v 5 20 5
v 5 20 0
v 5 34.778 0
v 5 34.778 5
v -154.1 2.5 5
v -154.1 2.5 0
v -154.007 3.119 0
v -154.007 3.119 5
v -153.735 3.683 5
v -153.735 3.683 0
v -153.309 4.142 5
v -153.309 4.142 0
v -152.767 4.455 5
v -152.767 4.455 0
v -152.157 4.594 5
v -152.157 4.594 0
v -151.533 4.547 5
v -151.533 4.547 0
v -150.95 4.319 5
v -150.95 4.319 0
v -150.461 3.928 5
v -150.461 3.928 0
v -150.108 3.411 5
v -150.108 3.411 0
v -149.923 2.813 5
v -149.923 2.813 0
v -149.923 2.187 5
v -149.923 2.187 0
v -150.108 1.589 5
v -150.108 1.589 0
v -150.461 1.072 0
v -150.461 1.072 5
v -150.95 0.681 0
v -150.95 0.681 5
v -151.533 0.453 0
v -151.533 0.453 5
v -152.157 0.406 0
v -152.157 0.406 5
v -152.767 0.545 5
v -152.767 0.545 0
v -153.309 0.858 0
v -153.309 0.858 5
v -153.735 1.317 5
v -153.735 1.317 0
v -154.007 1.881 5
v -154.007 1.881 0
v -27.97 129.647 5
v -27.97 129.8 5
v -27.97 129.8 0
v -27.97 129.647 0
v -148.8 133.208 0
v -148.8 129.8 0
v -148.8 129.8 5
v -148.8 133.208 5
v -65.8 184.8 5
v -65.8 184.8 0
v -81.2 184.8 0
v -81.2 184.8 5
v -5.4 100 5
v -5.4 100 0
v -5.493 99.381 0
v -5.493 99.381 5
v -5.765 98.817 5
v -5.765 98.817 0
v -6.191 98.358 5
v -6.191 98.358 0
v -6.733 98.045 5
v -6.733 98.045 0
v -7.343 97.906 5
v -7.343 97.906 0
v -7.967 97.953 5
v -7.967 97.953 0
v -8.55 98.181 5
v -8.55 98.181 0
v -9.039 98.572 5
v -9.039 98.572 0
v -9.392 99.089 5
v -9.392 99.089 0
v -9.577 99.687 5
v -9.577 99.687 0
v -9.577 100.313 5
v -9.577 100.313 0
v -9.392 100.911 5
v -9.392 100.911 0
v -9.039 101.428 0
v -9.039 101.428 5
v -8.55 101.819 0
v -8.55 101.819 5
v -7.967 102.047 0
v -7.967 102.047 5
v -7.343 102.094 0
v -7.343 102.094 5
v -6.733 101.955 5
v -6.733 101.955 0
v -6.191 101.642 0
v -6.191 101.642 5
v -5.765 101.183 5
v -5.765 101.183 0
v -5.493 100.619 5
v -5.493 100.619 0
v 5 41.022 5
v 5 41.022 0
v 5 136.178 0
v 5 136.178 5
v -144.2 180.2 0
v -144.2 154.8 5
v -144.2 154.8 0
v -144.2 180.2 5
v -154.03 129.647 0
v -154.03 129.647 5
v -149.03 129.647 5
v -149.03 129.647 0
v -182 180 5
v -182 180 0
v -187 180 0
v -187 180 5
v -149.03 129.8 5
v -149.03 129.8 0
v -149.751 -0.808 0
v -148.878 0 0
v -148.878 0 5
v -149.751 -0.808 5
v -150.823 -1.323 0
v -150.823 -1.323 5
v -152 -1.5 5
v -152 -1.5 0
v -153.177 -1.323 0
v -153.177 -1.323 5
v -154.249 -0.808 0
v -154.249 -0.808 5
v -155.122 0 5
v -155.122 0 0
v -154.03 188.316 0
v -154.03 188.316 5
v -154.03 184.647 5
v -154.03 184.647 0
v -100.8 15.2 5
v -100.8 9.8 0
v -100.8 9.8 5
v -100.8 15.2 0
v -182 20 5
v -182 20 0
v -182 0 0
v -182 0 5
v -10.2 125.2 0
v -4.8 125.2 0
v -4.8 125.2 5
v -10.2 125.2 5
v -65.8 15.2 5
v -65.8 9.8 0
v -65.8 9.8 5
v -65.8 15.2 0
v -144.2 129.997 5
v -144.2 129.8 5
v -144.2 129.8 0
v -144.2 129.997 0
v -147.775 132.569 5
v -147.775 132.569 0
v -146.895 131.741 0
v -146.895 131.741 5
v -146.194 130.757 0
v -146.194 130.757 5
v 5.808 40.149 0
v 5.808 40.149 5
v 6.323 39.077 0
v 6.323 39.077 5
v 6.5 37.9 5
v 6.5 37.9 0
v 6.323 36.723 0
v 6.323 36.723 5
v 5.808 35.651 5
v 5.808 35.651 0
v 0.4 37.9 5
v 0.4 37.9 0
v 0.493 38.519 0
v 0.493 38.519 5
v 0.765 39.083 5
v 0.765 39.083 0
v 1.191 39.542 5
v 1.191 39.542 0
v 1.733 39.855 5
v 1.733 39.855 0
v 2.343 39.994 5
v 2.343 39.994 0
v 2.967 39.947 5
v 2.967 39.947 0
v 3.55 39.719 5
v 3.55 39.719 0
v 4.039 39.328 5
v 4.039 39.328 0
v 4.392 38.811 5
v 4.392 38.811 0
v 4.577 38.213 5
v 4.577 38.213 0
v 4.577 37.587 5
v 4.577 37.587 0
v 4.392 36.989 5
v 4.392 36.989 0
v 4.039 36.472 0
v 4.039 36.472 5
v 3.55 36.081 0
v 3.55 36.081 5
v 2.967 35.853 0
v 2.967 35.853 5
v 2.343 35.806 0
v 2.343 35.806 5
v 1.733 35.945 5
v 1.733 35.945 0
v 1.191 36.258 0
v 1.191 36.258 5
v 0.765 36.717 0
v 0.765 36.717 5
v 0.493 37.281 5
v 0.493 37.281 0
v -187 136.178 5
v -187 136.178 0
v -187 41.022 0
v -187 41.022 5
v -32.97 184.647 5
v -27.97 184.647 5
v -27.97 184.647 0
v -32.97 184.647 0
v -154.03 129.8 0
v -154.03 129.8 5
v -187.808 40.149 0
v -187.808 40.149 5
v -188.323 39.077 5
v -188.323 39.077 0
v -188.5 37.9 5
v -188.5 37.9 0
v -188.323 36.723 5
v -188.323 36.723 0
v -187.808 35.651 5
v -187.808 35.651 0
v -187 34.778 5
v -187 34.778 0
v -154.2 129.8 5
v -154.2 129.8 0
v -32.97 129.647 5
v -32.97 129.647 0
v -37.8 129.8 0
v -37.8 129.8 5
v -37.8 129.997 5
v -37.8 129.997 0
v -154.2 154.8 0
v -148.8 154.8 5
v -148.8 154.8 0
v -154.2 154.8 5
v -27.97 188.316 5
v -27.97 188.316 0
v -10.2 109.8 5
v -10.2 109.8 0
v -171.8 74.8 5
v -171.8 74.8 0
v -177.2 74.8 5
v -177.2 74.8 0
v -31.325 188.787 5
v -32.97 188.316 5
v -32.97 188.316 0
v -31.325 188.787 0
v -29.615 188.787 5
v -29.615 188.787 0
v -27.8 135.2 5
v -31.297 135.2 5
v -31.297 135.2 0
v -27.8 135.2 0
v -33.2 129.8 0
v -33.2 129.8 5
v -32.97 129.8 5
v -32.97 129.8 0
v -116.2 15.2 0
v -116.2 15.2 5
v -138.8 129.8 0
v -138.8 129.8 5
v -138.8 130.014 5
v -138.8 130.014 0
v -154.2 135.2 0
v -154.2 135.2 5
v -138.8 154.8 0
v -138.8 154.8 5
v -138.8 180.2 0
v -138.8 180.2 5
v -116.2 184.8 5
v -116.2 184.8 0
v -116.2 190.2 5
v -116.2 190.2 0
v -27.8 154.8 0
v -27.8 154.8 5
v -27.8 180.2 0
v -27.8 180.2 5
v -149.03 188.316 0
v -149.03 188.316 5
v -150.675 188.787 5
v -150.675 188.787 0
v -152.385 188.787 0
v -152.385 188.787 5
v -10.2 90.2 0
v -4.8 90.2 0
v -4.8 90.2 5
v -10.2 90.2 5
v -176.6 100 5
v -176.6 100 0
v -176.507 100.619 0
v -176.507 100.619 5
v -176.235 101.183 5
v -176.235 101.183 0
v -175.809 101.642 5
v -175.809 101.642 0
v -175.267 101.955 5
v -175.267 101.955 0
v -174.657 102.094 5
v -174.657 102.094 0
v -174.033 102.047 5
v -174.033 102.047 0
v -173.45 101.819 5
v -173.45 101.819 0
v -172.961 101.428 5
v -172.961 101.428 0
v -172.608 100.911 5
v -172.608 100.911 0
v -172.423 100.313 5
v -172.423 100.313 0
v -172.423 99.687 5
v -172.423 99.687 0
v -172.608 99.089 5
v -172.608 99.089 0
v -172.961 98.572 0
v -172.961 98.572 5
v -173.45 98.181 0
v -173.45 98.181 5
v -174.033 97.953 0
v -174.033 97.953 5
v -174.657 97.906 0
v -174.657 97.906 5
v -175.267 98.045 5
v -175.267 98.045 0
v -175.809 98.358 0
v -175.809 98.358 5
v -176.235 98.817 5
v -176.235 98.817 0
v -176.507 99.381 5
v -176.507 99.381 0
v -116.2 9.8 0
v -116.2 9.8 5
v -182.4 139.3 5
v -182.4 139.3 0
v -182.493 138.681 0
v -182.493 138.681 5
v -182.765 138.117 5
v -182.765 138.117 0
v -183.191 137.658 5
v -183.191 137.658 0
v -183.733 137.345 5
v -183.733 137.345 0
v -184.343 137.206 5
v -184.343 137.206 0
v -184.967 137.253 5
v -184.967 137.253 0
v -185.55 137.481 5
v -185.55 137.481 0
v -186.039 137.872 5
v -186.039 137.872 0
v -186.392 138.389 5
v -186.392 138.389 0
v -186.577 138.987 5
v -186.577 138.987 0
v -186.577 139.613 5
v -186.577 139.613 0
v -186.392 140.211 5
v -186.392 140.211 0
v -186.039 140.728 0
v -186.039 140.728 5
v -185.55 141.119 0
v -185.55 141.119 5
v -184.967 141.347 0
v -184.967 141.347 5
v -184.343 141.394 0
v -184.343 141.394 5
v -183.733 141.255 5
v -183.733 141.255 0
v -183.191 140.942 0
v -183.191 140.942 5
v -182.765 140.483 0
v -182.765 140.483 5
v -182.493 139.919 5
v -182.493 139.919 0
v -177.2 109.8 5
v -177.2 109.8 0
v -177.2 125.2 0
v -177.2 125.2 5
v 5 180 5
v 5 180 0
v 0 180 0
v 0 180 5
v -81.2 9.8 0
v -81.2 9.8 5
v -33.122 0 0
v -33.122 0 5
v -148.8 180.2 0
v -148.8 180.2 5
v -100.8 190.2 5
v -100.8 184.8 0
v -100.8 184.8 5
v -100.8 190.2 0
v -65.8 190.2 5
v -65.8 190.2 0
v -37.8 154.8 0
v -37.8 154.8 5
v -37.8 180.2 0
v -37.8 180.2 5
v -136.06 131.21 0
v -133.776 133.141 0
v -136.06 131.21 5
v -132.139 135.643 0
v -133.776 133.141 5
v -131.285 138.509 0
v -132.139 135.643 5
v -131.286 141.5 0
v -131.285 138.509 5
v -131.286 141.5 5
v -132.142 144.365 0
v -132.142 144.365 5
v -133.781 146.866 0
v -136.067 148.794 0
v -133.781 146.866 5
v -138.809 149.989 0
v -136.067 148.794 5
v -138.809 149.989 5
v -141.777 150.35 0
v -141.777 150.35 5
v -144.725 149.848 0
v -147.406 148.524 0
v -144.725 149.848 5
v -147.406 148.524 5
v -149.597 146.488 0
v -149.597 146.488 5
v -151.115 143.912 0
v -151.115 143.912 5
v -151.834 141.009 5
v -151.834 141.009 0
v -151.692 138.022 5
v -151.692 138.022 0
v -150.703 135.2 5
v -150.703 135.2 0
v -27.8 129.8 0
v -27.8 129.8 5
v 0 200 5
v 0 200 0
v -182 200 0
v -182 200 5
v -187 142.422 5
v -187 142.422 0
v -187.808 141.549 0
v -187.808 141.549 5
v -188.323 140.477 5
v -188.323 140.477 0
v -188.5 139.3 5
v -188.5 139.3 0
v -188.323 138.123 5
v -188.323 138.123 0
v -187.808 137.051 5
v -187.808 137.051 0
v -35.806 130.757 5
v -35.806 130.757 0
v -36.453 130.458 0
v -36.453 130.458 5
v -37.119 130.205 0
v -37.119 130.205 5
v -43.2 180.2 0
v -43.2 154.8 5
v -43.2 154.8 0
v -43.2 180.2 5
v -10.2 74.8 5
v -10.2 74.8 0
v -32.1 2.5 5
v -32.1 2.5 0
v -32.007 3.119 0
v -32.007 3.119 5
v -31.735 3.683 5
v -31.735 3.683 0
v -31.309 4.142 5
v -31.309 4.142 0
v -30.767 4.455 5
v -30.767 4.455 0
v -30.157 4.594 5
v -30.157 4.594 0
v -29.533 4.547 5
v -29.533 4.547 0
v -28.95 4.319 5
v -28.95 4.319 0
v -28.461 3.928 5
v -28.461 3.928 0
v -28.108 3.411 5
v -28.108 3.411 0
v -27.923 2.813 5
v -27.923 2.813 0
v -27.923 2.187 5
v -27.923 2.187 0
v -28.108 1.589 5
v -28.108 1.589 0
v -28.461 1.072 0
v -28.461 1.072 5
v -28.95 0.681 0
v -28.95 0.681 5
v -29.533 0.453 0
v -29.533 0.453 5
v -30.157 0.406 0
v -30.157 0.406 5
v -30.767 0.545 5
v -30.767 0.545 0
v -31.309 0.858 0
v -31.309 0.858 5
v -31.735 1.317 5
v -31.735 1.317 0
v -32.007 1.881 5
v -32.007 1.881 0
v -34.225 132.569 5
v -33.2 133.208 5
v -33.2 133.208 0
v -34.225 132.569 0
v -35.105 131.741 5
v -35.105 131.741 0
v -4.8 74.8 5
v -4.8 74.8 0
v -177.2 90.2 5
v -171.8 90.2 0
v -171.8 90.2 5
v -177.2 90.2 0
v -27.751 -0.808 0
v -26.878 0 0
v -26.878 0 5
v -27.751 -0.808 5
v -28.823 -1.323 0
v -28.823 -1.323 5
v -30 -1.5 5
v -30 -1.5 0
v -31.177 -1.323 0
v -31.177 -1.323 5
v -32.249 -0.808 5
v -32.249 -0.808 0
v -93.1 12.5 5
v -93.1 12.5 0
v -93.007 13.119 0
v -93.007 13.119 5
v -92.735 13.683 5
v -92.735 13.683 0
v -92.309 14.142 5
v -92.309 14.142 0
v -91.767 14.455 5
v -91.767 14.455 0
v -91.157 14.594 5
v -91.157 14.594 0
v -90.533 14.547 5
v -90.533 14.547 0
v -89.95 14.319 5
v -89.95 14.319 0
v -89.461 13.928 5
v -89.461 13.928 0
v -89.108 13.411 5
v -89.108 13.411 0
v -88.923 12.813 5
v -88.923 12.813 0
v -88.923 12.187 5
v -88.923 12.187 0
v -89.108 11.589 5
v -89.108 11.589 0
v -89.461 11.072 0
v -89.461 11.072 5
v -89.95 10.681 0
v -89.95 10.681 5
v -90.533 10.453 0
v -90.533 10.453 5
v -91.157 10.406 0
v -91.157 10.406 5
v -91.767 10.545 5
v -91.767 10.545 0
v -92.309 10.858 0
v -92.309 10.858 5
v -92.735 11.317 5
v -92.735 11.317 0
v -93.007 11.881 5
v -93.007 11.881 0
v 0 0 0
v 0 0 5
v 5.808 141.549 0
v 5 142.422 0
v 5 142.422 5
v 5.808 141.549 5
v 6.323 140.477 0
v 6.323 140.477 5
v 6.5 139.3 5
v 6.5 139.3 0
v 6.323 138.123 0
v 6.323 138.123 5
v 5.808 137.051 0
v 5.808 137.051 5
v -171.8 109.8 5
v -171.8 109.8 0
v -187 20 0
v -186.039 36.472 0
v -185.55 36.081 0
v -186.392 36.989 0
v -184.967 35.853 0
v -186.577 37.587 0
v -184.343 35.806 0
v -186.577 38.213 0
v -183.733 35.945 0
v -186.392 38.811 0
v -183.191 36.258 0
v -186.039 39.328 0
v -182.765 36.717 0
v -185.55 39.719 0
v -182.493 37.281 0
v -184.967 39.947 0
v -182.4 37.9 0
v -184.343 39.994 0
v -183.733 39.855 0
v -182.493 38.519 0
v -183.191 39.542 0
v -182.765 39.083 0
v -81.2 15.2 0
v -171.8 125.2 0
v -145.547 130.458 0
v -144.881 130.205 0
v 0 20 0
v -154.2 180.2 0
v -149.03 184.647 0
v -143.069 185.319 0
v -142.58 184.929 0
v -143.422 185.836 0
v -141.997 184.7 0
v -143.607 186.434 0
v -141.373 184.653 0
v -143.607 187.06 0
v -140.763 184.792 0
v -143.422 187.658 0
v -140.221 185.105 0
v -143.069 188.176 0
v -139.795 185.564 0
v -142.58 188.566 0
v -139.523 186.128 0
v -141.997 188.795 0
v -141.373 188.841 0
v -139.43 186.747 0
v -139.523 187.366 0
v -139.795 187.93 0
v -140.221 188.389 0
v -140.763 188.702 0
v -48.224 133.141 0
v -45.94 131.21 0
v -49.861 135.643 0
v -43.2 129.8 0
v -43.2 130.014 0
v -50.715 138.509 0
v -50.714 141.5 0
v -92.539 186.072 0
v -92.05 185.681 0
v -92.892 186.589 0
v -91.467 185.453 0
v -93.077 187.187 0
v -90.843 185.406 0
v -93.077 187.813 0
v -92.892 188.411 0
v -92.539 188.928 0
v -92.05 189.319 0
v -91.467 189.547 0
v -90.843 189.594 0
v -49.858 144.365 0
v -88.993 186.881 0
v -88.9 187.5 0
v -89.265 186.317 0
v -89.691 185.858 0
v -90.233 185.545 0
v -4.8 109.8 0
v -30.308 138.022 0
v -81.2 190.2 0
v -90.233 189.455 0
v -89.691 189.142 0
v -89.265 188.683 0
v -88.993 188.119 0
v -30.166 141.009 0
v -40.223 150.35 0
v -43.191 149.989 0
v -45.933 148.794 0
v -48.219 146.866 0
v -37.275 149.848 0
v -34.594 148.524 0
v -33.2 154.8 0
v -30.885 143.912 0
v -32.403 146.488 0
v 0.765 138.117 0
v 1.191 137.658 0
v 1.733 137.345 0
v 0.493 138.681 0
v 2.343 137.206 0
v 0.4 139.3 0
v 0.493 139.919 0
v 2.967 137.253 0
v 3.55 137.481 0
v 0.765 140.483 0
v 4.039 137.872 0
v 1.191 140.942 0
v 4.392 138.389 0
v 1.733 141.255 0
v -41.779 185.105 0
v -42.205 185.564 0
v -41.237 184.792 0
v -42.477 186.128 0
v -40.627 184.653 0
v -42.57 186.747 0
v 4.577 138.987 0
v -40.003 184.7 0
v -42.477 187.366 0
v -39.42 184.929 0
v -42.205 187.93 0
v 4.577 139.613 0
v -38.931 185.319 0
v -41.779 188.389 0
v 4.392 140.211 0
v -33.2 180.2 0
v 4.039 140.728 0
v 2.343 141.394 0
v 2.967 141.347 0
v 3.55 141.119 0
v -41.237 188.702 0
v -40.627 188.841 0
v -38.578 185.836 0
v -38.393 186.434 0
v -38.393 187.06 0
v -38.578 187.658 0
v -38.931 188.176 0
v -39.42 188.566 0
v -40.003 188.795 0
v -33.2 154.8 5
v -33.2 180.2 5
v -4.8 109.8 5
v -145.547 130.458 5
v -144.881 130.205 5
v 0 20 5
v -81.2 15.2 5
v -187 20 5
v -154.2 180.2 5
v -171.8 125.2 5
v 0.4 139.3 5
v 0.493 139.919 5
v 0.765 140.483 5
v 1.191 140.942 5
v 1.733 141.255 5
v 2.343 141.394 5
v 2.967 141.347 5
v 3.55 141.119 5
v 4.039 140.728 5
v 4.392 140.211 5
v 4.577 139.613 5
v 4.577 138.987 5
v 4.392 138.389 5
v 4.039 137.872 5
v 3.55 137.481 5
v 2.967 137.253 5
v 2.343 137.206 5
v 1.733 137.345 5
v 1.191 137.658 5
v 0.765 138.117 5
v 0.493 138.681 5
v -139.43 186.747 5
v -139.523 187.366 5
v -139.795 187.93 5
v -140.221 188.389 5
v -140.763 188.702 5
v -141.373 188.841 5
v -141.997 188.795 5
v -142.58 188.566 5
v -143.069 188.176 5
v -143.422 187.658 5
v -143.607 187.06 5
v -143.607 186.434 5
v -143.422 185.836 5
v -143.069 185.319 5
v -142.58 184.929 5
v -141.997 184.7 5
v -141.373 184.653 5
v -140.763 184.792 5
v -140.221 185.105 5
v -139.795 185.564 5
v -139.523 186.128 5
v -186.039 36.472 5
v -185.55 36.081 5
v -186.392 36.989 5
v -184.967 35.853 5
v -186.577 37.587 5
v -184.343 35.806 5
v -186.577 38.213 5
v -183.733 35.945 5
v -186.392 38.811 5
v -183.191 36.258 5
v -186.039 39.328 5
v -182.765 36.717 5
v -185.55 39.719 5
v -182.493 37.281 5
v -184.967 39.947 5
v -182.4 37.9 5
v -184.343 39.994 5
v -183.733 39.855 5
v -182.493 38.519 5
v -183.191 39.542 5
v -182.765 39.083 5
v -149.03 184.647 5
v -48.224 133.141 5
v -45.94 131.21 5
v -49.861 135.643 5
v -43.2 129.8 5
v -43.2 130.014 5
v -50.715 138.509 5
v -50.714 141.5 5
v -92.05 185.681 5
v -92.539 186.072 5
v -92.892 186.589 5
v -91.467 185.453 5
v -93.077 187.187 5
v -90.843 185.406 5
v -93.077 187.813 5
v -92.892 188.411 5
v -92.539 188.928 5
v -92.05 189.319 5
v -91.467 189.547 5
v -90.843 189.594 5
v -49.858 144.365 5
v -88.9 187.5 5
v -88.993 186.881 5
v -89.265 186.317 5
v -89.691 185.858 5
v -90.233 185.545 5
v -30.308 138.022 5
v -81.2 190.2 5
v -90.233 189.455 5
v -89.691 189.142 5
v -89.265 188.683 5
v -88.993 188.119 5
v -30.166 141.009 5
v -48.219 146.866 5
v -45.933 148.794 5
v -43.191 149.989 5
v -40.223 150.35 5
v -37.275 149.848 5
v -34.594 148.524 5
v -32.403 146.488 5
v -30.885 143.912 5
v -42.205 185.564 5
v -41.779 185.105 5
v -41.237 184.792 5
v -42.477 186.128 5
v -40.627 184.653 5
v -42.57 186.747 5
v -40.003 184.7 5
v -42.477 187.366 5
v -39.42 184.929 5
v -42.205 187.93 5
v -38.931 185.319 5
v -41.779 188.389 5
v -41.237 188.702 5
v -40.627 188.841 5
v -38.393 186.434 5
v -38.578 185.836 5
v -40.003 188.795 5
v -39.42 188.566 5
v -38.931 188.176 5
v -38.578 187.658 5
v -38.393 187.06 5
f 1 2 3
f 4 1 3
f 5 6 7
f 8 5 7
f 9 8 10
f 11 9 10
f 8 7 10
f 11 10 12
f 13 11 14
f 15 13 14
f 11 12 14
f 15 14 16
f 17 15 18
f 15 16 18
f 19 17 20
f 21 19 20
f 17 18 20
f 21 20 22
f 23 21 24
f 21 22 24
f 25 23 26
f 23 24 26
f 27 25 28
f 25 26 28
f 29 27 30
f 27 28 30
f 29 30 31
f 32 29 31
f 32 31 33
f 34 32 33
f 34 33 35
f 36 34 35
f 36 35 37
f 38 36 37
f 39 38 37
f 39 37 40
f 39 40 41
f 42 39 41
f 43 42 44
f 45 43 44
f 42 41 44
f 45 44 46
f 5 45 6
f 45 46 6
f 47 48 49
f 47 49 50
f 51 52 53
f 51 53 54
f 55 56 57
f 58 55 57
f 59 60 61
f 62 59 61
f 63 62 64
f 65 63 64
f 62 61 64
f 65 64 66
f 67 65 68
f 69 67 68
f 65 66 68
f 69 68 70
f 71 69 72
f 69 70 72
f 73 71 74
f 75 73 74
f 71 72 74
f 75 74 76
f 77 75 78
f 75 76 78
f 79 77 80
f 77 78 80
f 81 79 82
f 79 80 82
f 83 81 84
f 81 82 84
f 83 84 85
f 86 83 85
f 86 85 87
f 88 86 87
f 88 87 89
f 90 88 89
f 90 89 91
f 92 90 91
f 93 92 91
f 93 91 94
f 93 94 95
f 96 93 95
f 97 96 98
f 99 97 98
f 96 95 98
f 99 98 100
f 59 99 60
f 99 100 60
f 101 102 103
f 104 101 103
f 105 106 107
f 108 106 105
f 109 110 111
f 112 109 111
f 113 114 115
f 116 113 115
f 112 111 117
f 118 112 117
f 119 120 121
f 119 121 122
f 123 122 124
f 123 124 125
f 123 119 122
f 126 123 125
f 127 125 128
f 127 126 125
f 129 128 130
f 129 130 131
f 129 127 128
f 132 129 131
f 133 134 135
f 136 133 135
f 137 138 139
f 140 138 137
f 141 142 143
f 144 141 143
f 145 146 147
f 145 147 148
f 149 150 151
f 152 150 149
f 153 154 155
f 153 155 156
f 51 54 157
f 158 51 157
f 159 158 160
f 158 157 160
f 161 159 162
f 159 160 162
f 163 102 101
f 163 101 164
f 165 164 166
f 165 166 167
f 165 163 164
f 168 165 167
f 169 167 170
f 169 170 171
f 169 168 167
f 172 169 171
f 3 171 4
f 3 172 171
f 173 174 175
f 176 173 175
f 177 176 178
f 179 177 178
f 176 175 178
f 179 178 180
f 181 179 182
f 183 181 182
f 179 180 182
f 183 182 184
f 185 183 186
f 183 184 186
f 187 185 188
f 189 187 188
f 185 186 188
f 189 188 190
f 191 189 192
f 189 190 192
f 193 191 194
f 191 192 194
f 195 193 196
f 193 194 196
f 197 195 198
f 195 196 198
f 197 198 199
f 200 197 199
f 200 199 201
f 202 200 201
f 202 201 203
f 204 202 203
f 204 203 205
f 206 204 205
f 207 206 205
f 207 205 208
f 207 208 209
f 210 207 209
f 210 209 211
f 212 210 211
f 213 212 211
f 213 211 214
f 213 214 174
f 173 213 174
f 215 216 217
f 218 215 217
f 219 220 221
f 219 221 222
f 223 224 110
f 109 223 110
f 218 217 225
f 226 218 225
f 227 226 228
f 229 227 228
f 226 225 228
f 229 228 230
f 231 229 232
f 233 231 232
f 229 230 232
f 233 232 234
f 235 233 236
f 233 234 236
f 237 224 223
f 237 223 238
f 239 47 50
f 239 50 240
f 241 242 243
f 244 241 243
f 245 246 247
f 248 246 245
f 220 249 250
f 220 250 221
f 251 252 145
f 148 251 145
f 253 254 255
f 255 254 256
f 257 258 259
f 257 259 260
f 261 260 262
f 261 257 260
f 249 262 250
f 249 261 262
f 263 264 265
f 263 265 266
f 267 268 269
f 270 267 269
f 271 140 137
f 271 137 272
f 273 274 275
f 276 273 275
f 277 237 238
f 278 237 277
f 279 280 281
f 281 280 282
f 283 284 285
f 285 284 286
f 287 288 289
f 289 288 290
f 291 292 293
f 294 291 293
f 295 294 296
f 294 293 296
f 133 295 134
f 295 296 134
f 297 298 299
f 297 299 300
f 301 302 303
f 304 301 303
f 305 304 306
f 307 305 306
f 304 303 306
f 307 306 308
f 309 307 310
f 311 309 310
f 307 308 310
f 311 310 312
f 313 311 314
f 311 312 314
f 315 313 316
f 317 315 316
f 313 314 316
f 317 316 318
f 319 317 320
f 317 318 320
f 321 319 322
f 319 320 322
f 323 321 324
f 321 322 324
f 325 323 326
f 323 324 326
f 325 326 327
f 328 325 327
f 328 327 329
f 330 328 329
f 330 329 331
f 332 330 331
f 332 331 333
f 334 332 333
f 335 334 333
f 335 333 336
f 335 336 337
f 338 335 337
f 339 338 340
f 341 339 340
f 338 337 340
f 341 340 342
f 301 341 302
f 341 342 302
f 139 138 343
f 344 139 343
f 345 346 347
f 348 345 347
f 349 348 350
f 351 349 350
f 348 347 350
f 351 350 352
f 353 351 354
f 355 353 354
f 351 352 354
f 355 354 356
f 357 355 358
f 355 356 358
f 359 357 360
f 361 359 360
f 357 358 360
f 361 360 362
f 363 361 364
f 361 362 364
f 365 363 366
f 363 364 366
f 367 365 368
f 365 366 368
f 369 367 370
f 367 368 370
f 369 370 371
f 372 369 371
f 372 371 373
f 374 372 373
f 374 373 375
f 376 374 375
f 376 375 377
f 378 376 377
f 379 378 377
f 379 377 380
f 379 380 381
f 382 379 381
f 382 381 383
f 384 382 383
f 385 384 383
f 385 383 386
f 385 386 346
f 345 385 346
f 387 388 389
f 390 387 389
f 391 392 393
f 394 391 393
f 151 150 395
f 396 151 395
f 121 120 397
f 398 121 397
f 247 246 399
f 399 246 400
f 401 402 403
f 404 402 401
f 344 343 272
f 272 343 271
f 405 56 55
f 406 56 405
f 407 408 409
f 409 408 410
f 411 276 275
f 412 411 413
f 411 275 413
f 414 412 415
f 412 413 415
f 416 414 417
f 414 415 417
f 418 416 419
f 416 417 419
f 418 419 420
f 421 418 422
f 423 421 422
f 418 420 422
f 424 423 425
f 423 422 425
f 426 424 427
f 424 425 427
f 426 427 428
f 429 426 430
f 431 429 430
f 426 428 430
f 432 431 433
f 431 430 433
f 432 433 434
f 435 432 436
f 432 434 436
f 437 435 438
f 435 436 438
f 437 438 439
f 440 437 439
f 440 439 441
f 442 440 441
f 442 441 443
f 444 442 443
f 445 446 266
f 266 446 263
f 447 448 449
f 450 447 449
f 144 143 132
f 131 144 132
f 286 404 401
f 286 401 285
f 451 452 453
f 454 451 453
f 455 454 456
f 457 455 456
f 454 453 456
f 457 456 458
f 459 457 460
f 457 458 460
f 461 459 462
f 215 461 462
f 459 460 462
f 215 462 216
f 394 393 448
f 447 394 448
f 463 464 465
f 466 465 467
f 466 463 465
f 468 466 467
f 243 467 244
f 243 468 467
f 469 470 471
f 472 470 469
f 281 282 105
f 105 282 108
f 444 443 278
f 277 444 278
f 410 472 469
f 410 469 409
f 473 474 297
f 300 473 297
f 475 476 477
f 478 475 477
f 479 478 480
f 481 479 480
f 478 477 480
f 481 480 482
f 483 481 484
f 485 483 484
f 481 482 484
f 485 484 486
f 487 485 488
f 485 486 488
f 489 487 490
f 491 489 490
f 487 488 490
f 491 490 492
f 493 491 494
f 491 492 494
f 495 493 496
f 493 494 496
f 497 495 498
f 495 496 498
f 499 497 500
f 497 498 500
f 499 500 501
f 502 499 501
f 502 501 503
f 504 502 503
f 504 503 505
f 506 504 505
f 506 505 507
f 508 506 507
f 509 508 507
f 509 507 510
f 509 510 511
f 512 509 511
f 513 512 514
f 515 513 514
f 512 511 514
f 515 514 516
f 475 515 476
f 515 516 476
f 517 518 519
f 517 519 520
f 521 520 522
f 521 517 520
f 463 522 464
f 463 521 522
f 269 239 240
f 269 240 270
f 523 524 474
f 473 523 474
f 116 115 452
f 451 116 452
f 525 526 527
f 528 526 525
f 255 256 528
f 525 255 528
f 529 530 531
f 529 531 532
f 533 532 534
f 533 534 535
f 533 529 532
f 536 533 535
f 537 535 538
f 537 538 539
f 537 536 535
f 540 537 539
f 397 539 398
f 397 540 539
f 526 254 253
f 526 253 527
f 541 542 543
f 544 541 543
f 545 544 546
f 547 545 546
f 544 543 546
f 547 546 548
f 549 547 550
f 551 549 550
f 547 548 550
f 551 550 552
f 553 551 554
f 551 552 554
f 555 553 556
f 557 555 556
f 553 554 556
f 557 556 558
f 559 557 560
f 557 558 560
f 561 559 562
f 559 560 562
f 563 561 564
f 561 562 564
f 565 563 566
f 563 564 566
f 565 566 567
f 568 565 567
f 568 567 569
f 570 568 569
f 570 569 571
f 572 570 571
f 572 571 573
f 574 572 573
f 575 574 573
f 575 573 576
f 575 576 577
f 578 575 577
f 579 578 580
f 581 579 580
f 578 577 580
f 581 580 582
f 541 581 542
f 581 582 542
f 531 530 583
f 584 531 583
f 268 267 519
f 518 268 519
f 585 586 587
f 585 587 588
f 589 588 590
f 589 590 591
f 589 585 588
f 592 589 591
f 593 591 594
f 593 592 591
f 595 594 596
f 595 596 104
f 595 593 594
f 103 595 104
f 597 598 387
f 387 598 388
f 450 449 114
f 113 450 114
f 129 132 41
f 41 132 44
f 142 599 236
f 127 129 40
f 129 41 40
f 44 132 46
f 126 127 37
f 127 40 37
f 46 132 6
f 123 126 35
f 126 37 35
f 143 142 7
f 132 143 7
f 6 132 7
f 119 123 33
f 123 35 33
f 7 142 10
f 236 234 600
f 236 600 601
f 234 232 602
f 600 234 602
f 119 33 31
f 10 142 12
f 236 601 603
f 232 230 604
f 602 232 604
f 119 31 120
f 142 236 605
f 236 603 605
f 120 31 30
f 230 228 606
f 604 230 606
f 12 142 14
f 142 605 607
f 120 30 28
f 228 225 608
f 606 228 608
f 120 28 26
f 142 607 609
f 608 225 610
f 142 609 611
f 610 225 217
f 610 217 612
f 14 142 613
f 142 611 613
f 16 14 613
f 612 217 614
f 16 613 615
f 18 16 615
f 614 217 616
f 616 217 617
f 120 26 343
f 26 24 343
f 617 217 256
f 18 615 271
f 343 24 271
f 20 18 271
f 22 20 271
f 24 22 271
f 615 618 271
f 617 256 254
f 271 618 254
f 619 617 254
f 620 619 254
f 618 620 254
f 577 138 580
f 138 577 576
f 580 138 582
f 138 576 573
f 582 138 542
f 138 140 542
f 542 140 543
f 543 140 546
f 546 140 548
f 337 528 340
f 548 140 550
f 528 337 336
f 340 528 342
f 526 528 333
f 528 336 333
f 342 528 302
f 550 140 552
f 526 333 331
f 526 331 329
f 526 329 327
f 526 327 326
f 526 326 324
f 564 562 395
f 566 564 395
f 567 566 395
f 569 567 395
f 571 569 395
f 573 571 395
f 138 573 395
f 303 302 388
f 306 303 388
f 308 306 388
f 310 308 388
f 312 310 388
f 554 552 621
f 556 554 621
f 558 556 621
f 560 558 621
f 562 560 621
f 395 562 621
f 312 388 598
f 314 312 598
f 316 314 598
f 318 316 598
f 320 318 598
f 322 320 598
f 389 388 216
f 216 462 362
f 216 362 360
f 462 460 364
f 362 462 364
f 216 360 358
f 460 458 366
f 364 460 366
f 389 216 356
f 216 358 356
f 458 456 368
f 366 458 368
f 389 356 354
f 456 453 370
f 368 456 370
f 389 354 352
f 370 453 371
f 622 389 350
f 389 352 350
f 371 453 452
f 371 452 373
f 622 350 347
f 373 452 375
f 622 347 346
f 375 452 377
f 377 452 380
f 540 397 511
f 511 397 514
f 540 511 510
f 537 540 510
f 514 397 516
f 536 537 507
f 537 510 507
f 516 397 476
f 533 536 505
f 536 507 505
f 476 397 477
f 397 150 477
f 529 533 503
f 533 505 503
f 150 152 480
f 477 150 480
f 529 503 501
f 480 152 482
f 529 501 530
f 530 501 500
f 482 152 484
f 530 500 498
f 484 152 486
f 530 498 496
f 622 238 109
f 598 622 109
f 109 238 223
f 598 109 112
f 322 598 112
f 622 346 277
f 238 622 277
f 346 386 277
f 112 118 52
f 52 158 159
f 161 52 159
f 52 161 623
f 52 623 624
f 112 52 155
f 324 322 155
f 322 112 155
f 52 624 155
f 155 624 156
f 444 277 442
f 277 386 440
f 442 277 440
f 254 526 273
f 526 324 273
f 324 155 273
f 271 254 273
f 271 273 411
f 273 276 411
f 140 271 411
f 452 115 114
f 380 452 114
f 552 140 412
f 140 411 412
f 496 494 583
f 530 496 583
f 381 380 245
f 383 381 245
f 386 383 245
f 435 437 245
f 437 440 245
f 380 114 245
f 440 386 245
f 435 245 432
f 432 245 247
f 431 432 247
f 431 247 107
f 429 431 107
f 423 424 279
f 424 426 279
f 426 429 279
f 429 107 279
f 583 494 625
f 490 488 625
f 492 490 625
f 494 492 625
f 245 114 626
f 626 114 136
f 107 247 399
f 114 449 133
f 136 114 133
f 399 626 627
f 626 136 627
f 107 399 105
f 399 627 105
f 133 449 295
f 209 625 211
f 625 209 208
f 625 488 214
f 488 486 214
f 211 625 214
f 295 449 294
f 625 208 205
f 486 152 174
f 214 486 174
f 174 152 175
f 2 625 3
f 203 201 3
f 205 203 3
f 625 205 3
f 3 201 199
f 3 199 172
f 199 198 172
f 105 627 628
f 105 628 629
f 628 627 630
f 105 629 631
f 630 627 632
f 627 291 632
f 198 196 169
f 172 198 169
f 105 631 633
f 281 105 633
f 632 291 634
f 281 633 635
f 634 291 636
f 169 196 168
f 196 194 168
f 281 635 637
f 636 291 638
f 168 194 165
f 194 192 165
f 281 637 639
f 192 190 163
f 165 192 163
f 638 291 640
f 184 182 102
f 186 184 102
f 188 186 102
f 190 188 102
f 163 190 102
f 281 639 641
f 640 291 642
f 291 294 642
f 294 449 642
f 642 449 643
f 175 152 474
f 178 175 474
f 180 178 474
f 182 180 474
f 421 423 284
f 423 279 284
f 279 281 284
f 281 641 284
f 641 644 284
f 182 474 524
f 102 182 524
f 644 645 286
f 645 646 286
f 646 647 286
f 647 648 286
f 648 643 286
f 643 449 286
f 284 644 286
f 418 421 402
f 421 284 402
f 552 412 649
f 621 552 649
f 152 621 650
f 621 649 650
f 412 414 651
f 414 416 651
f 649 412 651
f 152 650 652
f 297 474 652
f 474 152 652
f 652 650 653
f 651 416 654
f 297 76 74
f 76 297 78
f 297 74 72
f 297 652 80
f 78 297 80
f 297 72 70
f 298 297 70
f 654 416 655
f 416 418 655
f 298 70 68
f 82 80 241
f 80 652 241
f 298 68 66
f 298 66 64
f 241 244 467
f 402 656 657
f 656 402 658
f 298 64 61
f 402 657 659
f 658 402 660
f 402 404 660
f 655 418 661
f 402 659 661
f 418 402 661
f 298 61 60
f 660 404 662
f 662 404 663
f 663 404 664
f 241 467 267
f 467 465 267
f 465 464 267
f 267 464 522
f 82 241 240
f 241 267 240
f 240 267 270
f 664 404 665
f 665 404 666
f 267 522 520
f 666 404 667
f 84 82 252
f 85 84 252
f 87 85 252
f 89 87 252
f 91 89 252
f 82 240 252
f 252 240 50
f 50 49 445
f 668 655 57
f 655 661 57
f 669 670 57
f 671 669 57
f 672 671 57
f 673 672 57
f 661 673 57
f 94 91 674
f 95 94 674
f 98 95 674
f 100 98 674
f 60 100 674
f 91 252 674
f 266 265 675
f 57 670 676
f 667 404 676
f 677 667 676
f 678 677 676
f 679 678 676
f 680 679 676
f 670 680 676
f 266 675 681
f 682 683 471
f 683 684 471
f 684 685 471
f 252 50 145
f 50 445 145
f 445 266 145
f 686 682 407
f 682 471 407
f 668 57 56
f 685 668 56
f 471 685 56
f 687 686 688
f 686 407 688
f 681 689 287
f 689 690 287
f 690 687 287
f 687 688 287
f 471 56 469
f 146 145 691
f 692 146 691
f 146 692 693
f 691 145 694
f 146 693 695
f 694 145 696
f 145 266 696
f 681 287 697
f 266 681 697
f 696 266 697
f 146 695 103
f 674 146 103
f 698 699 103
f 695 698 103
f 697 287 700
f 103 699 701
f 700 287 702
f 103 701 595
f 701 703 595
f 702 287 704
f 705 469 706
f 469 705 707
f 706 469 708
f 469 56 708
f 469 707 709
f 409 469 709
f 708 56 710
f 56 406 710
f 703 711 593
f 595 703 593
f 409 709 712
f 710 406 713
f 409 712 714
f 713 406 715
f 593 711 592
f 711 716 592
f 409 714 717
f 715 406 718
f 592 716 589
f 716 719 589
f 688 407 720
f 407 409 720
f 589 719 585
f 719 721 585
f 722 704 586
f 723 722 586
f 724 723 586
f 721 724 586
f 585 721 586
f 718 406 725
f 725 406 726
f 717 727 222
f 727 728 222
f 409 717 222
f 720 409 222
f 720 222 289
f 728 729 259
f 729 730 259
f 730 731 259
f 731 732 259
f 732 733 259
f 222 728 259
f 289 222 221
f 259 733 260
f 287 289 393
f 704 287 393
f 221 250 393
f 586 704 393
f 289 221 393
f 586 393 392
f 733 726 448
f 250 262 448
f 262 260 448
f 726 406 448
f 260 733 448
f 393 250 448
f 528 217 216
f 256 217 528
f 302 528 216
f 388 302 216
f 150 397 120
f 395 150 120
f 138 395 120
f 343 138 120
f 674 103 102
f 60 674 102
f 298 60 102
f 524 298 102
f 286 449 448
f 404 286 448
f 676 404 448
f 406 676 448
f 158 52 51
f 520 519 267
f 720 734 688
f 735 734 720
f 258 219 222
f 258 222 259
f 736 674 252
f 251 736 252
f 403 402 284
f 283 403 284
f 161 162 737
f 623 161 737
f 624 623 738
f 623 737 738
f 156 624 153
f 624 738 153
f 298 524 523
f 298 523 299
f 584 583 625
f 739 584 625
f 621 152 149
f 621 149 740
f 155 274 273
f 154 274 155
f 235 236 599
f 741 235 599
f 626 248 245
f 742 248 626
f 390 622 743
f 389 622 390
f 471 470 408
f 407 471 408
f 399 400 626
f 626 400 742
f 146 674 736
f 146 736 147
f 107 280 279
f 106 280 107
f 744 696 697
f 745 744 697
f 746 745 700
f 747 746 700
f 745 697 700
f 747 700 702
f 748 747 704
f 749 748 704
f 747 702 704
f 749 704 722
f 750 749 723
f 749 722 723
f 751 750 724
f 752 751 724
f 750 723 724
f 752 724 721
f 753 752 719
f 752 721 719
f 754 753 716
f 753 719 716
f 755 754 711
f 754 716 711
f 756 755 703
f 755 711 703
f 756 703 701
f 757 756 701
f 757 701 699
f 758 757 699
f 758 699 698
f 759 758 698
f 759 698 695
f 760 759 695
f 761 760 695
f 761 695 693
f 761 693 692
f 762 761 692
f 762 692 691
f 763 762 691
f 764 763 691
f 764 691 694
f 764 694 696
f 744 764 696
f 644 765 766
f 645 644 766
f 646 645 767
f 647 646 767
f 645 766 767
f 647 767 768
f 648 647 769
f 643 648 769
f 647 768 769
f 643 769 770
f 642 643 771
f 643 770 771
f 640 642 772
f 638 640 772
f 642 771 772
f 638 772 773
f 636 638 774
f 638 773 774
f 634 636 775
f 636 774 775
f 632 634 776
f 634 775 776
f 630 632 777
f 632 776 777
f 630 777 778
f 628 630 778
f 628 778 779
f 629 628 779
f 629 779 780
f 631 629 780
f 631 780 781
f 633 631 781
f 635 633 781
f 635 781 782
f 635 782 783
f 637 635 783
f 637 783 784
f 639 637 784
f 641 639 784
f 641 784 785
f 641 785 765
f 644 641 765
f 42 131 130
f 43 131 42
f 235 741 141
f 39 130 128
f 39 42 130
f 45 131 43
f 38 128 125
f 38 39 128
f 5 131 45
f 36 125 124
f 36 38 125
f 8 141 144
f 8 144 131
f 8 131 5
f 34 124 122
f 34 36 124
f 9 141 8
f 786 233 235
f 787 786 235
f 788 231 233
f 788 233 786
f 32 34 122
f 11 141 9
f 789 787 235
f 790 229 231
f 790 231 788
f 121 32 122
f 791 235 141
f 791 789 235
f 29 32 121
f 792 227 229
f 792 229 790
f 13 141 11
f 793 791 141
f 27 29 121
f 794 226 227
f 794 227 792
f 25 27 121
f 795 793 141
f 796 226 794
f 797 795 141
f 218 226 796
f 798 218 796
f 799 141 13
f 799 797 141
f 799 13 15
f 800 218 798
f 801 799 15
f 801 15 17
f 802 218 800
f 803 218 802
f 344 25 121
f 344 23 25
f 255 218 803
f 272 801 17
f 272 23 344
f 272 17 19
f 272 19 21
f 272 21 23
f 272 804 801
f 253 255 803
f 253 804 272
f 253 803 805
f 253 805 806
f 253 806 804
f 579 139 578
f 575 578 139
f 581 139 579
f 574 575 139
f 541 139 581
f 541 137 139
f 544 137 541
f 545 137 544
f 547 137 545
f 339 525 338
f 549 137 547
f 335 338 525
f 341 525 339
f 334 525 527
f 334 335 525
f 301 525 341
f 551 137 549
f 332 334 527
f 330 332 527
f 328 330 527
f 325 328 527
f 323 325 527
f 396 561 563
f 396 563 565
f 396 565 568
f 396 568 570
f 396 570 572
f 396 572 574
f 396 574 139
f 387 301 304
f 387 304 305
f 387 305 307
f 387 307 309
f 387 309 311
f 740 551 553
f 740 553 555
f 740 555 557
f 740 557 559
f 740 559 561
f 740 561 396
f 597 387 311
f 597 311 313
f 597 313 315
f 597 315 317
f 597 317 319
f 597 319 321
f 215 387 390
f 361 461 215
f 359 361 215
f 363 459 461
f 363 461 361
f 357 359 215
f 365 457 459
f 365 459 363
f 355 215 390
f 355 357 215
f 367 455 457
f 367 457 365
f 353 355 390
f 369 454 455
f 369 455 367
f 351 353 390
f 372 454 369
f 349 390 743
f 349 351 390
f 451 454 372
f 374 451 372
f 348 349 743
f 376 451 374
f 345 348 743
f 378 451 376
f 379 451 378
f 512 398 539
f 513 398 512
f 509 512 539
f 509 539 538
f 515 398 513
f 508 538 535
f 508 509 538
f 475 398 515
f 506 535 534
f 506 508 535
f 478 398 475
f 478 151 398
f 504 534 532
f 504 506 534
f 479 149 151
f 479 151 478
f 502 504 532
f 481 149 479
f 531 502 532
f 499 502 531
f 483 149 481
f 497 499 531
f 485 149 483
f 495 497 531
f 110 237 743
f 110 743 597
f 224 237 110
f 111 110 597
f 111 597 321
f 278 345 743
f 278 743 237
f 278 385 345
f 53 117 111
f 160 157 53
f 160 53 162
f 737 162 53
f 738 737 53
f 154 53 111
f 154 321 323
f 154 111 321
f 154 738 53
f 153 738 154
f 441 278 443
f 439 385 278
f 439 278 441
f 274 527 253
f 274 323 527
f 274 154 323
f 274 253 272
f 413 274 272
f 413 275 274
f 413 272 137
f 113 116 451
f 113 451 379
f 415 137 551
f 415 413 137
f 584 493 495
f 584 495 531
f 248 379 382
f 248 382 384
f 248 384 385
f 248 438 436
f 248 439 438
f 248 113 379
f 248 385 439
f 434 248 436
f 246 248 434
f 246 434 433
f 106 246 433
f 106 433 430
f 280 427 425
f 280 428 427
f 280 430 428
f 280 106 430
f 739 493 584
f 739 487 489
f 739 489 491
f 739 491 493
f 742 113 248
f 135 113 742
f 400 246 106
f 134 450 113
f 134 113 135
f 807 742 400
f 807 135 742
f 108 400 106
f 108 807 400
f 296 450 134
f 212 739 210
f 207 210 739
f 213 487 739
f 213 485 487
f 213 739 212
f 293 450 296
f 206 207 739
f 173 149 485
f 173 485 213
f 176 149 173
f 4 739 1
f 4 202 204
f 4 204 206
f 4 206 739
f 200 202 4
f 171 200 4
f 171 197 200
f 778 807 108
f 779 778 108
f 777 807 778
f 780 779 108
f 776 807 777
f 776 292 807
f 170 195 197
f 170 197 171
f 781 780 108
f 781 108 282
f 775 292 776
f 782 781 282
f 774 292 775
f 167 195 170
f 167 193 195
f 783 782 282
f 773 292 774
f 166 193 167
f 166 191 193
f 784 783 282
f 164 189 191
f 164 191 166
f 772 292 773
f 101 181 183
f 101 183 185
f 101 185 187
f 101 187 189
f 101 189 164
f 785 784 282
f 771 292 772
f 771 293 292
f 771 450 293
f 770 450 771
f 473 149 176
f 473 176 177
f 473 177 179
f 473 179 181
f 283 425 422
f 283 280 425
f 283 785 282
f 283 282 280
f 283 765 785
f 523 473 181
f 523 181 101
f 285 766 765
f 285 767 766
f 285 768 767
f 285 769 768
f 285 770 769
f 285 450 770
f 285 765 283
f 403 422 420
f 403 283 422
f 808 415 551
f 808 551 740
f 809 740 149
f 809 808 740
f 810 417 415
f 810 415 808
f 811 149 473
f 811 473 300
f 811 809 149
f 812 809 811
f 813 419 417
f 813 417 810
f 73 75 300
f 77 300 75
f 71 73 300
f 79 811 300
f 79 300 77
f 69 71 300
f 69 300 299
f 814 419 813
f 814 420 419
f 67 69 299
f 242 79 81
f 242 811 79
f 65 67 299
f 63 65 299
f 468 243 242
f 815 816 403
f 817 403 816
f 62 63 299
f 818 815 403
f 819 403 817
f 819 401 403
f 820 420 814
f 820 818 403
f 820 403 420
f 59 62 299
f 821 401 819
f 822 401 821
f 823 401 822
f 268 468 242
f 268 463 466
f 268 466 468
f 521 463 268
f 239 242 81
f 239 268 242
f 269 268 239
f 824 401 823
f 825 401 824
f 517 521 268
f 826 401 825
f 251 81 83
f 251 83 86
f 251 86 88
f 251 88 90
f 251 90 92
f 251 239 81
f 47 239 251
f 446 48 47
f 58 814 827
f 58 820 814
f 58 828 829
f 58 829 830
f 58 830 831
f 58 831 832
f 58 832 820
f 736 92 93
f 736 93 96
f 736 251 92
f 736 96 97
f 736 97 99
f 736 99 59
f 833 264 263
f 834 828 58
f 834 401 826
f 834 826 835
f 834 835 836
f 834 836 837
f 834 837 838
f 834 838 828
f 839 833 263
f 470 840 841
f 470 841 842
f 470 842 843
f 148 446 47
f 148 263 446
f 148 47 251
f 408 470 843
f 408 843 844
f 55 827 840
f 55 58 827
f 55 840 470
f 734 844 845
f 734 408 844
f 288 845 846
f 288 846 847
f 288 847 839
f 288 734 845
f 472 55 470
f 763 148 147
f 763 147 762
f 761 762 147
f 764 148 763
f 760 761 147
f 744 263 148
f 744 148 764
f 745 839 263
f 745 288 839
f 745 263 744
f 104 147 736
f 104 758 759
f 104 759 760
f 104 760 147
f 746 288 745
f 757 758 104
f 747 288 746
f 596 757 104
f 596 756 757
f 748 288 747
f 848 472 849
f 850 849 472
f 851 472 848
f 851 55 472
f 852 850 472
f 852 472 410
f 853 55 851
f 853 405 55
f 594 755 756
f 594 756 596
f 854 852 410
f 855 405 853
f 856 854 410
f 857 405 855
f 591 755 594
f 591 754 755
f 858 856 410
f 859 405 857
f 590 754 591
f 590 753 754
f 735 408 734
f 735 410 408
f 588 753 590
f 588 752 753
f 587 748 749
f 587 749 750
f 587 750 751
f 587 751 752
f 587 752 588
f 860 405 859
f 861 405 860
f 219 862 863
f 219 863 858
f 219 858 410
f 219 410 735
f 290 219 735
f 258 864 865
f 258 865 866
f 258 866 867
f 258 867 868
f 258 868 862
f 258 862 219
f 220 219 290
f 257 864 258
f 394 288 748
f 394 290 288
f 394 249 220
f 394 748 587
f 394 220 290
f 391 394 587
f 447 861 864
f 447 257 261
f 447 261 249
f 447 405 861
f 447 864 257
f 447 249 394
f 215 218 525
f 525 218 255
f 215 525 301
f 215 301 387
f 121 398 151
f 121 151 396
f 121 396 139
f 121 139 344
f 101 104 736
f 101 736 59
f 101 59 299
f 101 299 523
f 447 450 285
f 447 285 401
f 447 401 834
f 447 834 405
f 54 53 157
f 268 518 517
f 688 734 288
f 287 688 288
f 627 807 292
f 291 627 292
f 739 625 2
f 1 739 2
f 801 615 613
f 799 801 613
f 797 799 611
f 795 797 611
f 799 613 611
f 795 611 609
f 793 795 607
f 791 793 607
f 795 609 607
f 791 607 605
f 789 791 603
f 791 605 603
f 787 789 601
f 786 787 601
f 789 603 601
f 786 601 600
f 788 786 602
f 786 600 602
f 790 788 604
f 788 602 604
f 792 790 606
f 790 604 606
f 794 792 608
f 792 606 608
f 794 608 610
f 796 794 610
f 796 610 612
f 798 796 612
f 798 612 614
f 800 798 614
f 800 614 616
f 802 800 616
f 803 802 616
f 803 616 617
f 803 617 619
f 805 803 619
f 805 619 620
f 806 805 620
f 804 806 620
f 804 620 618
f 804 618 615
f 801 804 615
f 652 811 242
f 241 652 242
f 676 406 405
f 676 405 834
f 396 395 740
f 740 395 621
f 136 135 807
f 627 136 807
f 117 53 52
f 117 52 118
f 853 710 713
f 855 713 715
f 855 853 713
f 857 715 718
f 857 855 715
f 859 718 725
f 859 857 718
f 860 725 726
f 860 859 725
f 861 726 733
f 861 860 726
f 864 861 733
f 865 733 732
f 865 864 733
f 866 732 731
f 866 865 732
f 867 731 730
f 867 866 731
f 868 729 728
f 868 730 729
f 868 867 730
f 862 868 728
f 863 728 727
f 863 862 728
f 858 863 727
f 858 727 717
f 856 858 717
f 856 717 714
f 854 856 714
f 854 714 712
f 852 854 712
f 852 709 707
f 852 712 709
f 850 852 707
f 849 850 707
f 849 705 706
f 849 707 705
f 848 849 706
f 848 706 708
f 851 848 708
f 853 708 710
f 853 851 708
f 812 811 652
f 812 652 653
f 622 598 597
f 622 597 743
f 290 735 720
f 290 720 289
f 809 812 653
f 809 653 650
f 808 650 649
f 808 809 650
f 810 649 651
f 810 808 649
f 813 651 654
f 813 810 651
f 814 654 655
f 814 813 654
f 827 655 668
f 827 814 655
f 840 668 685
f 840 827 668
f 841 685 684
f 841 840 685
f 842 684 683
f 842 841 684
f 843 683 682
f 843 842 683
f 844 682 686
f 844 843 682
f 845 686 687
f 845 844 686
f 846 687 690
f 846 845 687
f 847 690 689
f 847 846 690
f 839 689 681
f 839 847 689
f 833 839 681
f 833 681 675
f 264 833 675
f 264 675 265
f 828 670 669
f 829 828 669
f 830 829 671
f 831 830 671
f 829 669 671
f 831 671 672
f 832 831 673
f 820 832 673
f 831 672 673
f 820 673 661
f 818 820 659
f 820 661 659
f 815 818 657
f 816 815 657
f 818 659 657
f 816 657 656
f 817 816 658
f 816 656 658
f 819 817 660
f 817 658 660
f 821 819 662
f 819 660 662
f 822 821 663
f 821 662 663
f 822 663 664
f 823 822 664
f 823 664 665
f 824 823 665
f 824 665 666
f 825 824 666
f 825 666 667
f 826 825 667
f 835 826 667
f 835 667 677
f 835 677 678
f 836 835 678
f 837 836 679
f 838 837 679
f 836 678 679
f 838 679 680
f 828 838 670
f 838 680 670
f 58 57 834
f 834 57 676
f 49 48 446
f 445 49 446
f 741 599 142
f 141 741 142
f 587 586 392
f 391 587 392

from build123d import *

# Parameters (mm, degrees)
BOSS_EXTRUDE1_DEPTH = 5
SKETCH2_R           = 2.1
CUT_EXTRUDE1_DEPTH  = 10
BOSS_EXTRUDE2_DEPTH = 5
BOSS_EXTRUDE3_DEPTH = 5
SKETCH5_R           = 2.1
CUT_EXTRUDE2_DEPTH  = 5
BOSS_EXTRUDE4_DEPTH = 5
SKETCH7_W           = 5.4
SKETCH7_H           = 25.4
SKETCH7_H_2         = 5.4
CUT_EXTRUDE4_DEPTH  = 5
SKETCH8_R           = 2.1
SKETCH8_W           = 15.4
SKETCH8_H           = 5.4
SKETCH8_W_2         = 15
SKETCH8_H_2         = 5
SKETCH8_W_3         = 5.4
SKETCH8_H_3         = 15.4
CUT_EXTRUDE5_DEPTH  = 5
SKETCH9_W           = 15
SKETCH9_H           = 5
CUT_EXTRUDE6_DEPTH  = 10
SKETCH10_R          = 2.1
CUT_EXTRUDE7_DEPTH  = 10


with BuildPart() as part:
    # Sketch1 → Boss-Extrude1 (new body)
    with BuildSketch(Plane.XY):
        Polygon((-182, 200), (-182, 180), (-187, 180), (-187, 20), (-182, 20), (-182, 0), (0, 0), (0, 20), (5, 20), (5, 180), (0, 180), (0, 200), align=None)
    extrude(amount=BOSS_EXTRUDE1_DEPTH)

    # Sketch2 → Cut-Extrude1 (cut)
    with BuildSketch(Plane(origin=(0, 0, 0), x_dir=(-1, 0, 0), z_dir=(0, 0, -1))):
        with Locations((-2.5, 139.3)):
            Circle(SKETCH2_R)
        with Locations((-2.5, 37.9)):
            Circle(SKETCH2_R)
        with Locations(Location((184.5, 37.9, 0), (0, 0, 180))):
            Circle(SKETCH2_R)
        with Locations(Location((184.5, 139.3, 0), (0, 0, 180))):
            Circle(SKETCH2_R)
    extrude(amount=-CUT_EXTRUDE1_DEPTH, mode=Mode.SUBTRACT)

    # Sketch3 → Boss-Extrude2 (add)
    with BuildSketch(Plane(origin=(0, 0, 0), x_dir=(-1, 0, 0), z_dir=(0, 0, -1))):
        with BuildLine():
            Line((-5, 136.177501001), (-5, 142.422498999))
            ThreePointArc((-5, 142.422498999), (-6.5, 139.3), (-5, 136.177501001))
        make_face()
    boss_extrude2 = extrude(amount=-BOSS_EXTRUDE2_DEPTH)

    # Sketch4 → Boss-Extrude3 (add)
    with BuildSketch(Plane(origin=(0, 0, 0), x_dir=(-1, 0, 0), z_dir=(0, 0, -1))):
        with BuildLine():
            Line((-5, 34.777501001), (-5, 41.022498999))
            ThreePointArc((-5, 41.022498999), (-6.5, 37.9), (-5, 34.777501001))
        make_face()
    boss_extrude3 = extrude(amount=-BOSS_EXTRUDE3_DEPTH)

    # Mirror1: Boss-Extrude2, Boss-Extrude3 across plane
    add(boss_extrude2.mirror(Plane.ZY.offset(91)))
    add(boss_extrude3.mirror(Plane.ZY.offset(91)))

    # Sketch5 → Cut-Extrude2 (cut)
    with BuildSketch(Plane(origin=(0, 0, 0), x_dir=(-1, 0, 0), z_dir=(0, 0, -1))):
        with Locations((30, 2.5)):
            Circle(SKETCH5_R)
        with Locations((152, 2.5)):
            Circle(SKETCH5_R)
    extrude(amount=-CUT_EXTRUDE2_DEPTH, mode=Mode.SUBTRACT)

    # Sketch6 → Boss-Extrude4 (add)
    with BuildSketch(Plane(origin=(0, 0, 0), x_dir=(-1, 0, 0), z_dir=(0, 0, -1))):
        with BuildLine():
            Line((155.122498999, 0), (148.877501001, 0))
            ThreePointArc((148.877501001, 0), (152, -1.5), (155.122498999, 0))
        make_face()
        with BuildLine():
            Line((33.122498999, 0), (26.877501001, 0))
            ThreePointArc((26.877501001, 0), (30, -1.5), (33.122498999, 0))
        make_face()
    extrude(amount=-BOSS_EXTRUDE4_DEPTH)

    # Sketch7 → Cut-Extrude4 (cut)
    with BuildSketch(Plane.XY.offset(5)):
        with Locations((-30.5, 167.5)):
            Rectangle(SKETCH7_W, SKETCH7_H)
        with Locations((-40.5, 167.5)):
            Rectangle(SKETCH7_W, SKETCH7_H)
        with Locations((-30.5, 132.5)):
            Rectangle(SKETCH7_W, SKETCH7_H_2)
        with Locations((-40.5, 132.5)):
            Rectangle(SKETCH7_W, SKETCH7_H_2)
    cut_extrude4 = extrude(amount=-CUT_EXTRUDE4_DEPTH, mode=Mode.SUBTRACT)

    # Mirror2: Cut-Extrude4 across plane
    add(cut_extrude4.mirror(Plane.ZY.offset(91)), mode=Mode.SUBTRACT)

    # Sketch8 → Cut-Extrude5 (cut)
    # profile 1 of 12: a face of its own
    with BuildSketch(Plane(origin=(0, 0, 0), x_dir=(-1, 0, 0), z_dir=(0, 0, -1))):
        with Locations((90.999998379, 12.5)):
            Circle(SKETCH8_R)
    # profile 2 of 12: a face of its own
    with BuildSketch(Plane(origin=(0, 0, 0), x_dir=(-1, 0, 0), z_dir=(0, 0, -1))):
        with Locations(Location((90.999998379, 187.5, 0), (0, 0, 180))):
            Circle(SKETCH8_R)
    # profile 3 of 12: a face of its own
    with BuildSketch(Plane(origin=(0, 0, 0), x_dir=(-1, 0, 0), z_dir=(0, 0, -1))):
        with Locations((174.499996757, 100)):
            Circle(SKETCH8_R)
    # profile 4 of 12: a face of its own
    with BuildSketch(Plane(origin=(0, 0, 0), x_dir=(-1, 0, 0), z_dir=(0, 0, -1))):
        with Locations(Location((7.5, 100, 0), (0, 0, 180))):
            Circle(SKETCH8_R)
    # profile 5 of 12: a face of its own
    with BuildSketch(Plane(origin=(0, 0, 0), x_dir=(-1, 0, 0), z_dir=(0, 0, -1))):
        with Locations((108.499998379, 187.5)):
            Rectangle(SKETCH8_W, SKETCH8_H)
    # profile 6 of 12: a face of its own
    with BuildSketch(Plane(origin=(0, 0, 0), x_dir=(-1, 0, 0), z_dir=(0, 0, -1))):
        with Locations((73.499998379, 12.5)):
            Rectangle(SKETCH8_W, SKETCH8_H)
        with Locations((73.499998379, 12.5)):
            Rectangle(SKETCH8_W_2, SKETCH8_H_2, mode=Mode.SUBTRACT)
    # profile 7 of 12: a face of its own
    with BuildSketch(Plane(origin=(0, 0, 0), x_dir=(-1, 0, 0), z_dir=(0, 0, -1))):
        with Locations((73.499998379, 187.5)):
            Rectangle(SKETCH8_W, SKETCH8_H)
    # profile 8 of 12: a face of its own
    with BuildSketch(Plane(origin=(0, 0, 0), x_dir=(-1, 0, 0), z_dir=(0, 0, -1))):
        with Locations((108.499998379, 12.5)):
            Rectangle(SKETCH8_W, SKETCH8_H)
    # profile 9 of 12: a face of its own
    with BuildSketch(Plane(origin=(0, 0, 0), x_dir=(-1, 0, 0), z_dir=(0, 0, -1))):
        with Locations((174.499996757, 82.5)):
            Rectangle(SKETCH8_W_3, SKETCH8_H_3)
    # profile 10 of 12: a face of its own
    with BuildSketch(Plane(origin=(0, 0, 0), x_dir=(-1, 0, 0), z_dir=(0, 0, -1))):
        with Locations((174.499996757, 117.5)):
            Rectangle(SKETCH8_W_3, SKETCH8_H_3)
    # profile 11 of 12: a face of its own
    with BuildSketch(Plane(origin=(0, 0, 0), x_dir=(-1, 0, 0), z_dir=(0, 0, -1))):
        with Locations((7.5, 82.5)):
            Rectangle(SKETCH8_W_3, SKETCH8_H_3)
    # profile 12 of 12: a face of its own
    with BuildSketch(Plane(origin=(0, 0, 0), x_dir=(-1, 0, 0), z_dir=(0, 0, -1))):
        with Locations((7.5, 117.5)):
            Rectangle(SKETCH8_W_3, SKETCH8_H_3)
    extrude(amount=-CUT_EXTRUDE5_DEPTH, mode=Mode.SUBTRACT)


with BuildPart() as cut_extrude5_piece_1:
    # of the separate pieces the step leaves, piece 1, a body of its own (cut_extrude5_pieces)
    add(part.part.solids().sort_by_distance((-182, 200, 0))[0])

    # Sketch10 → Cut-Extrude7 (cut)
    with BuildSketch(Plane.XY.offset(5)):
        with BuildLine():
            Line((-148.8, 135.2), (-148.8, 133.208307979))
            ThreePointArc((-148.8, 133.208307979), (-147.314689345, 132.176321717), (-146.193604234, 130.757057274))
            ThreePointArc((-146.193604234, 130.757057274), (-145.216422795, 130.325730949), (-144.2, 129.997385607))
            Line((-144.2, 129.997385607), (-144.2, 135.2))
            Line((-144.2, 135.2), (-138.8, 135.2))
            Line((-138.8, 135.2), (-138.8, 130.013594506))
            ThreePointArc((-138.8, 130.013594506), (-137.394509388, 149.490991099), (-150.702850957, 135.2))
            Line((-150.702850957, 135.2), (-148.8, 135.2))
        make_face()
        Polygon((-149.030035391, 129.647109894), (-149.030035433, 129.8), (-154.030035433, 129.8), (-154.030035391, 129.647108503), align=None)
        with Locations((-141.529997703, 186.747164896)):
            Circle(SKETCH10_R)
        with BuildLine():
            Line((-149.030050697, 184.647109894), (-149.030051718, 188.316347969))
            ThreePointArc((-149.030051718, 188.316347969), (-151.530056924, 188.847109198), (-154.030051718, 188.316298928))
            Line((-154.030051718, 188.316298928), (-154.030050697, 184.647108503))
            Line((-154.030050697, 184.647108503), (-149.030050697, 184.647109894))
        make_face()
    cut_extrude7 = extrude(amount=-CUT_EXTRUDE7_DEPTH, mode=Mode.SUBTRACT)

    # Mirror3: Cut-Extrude7 across plane
    add(cut_extrude7.mirror(Plane(origin=(-91, 0, 0), x_dir=(0, 0, 1), z_dir=(1, 0, 0))), mode=Mode.SUBTRACT)


with BuildPart() as cut_extrude5_piece_2:
    # of the separate pieces the step leaves, piece 2, a body of its own (cut_extrude5_pieces)
    add(part.part.solids().sort_by_distance((-80.999998379, 10, 0))[0])

    # Sketch9 → Cut-Extrude6 (cut)
    with BuildSketch(Plane.XY.offset(5)):
        with Locations((-73.499998379, 12.5)):
            Rectangle(SKETCH9_W, SKETCH9_H)
    extrude(amount=-CUT_EXTRUDE6_DEPTH, mode=Mode.SUBTRACT)


solid = cut_extrude5_piece_1.part
